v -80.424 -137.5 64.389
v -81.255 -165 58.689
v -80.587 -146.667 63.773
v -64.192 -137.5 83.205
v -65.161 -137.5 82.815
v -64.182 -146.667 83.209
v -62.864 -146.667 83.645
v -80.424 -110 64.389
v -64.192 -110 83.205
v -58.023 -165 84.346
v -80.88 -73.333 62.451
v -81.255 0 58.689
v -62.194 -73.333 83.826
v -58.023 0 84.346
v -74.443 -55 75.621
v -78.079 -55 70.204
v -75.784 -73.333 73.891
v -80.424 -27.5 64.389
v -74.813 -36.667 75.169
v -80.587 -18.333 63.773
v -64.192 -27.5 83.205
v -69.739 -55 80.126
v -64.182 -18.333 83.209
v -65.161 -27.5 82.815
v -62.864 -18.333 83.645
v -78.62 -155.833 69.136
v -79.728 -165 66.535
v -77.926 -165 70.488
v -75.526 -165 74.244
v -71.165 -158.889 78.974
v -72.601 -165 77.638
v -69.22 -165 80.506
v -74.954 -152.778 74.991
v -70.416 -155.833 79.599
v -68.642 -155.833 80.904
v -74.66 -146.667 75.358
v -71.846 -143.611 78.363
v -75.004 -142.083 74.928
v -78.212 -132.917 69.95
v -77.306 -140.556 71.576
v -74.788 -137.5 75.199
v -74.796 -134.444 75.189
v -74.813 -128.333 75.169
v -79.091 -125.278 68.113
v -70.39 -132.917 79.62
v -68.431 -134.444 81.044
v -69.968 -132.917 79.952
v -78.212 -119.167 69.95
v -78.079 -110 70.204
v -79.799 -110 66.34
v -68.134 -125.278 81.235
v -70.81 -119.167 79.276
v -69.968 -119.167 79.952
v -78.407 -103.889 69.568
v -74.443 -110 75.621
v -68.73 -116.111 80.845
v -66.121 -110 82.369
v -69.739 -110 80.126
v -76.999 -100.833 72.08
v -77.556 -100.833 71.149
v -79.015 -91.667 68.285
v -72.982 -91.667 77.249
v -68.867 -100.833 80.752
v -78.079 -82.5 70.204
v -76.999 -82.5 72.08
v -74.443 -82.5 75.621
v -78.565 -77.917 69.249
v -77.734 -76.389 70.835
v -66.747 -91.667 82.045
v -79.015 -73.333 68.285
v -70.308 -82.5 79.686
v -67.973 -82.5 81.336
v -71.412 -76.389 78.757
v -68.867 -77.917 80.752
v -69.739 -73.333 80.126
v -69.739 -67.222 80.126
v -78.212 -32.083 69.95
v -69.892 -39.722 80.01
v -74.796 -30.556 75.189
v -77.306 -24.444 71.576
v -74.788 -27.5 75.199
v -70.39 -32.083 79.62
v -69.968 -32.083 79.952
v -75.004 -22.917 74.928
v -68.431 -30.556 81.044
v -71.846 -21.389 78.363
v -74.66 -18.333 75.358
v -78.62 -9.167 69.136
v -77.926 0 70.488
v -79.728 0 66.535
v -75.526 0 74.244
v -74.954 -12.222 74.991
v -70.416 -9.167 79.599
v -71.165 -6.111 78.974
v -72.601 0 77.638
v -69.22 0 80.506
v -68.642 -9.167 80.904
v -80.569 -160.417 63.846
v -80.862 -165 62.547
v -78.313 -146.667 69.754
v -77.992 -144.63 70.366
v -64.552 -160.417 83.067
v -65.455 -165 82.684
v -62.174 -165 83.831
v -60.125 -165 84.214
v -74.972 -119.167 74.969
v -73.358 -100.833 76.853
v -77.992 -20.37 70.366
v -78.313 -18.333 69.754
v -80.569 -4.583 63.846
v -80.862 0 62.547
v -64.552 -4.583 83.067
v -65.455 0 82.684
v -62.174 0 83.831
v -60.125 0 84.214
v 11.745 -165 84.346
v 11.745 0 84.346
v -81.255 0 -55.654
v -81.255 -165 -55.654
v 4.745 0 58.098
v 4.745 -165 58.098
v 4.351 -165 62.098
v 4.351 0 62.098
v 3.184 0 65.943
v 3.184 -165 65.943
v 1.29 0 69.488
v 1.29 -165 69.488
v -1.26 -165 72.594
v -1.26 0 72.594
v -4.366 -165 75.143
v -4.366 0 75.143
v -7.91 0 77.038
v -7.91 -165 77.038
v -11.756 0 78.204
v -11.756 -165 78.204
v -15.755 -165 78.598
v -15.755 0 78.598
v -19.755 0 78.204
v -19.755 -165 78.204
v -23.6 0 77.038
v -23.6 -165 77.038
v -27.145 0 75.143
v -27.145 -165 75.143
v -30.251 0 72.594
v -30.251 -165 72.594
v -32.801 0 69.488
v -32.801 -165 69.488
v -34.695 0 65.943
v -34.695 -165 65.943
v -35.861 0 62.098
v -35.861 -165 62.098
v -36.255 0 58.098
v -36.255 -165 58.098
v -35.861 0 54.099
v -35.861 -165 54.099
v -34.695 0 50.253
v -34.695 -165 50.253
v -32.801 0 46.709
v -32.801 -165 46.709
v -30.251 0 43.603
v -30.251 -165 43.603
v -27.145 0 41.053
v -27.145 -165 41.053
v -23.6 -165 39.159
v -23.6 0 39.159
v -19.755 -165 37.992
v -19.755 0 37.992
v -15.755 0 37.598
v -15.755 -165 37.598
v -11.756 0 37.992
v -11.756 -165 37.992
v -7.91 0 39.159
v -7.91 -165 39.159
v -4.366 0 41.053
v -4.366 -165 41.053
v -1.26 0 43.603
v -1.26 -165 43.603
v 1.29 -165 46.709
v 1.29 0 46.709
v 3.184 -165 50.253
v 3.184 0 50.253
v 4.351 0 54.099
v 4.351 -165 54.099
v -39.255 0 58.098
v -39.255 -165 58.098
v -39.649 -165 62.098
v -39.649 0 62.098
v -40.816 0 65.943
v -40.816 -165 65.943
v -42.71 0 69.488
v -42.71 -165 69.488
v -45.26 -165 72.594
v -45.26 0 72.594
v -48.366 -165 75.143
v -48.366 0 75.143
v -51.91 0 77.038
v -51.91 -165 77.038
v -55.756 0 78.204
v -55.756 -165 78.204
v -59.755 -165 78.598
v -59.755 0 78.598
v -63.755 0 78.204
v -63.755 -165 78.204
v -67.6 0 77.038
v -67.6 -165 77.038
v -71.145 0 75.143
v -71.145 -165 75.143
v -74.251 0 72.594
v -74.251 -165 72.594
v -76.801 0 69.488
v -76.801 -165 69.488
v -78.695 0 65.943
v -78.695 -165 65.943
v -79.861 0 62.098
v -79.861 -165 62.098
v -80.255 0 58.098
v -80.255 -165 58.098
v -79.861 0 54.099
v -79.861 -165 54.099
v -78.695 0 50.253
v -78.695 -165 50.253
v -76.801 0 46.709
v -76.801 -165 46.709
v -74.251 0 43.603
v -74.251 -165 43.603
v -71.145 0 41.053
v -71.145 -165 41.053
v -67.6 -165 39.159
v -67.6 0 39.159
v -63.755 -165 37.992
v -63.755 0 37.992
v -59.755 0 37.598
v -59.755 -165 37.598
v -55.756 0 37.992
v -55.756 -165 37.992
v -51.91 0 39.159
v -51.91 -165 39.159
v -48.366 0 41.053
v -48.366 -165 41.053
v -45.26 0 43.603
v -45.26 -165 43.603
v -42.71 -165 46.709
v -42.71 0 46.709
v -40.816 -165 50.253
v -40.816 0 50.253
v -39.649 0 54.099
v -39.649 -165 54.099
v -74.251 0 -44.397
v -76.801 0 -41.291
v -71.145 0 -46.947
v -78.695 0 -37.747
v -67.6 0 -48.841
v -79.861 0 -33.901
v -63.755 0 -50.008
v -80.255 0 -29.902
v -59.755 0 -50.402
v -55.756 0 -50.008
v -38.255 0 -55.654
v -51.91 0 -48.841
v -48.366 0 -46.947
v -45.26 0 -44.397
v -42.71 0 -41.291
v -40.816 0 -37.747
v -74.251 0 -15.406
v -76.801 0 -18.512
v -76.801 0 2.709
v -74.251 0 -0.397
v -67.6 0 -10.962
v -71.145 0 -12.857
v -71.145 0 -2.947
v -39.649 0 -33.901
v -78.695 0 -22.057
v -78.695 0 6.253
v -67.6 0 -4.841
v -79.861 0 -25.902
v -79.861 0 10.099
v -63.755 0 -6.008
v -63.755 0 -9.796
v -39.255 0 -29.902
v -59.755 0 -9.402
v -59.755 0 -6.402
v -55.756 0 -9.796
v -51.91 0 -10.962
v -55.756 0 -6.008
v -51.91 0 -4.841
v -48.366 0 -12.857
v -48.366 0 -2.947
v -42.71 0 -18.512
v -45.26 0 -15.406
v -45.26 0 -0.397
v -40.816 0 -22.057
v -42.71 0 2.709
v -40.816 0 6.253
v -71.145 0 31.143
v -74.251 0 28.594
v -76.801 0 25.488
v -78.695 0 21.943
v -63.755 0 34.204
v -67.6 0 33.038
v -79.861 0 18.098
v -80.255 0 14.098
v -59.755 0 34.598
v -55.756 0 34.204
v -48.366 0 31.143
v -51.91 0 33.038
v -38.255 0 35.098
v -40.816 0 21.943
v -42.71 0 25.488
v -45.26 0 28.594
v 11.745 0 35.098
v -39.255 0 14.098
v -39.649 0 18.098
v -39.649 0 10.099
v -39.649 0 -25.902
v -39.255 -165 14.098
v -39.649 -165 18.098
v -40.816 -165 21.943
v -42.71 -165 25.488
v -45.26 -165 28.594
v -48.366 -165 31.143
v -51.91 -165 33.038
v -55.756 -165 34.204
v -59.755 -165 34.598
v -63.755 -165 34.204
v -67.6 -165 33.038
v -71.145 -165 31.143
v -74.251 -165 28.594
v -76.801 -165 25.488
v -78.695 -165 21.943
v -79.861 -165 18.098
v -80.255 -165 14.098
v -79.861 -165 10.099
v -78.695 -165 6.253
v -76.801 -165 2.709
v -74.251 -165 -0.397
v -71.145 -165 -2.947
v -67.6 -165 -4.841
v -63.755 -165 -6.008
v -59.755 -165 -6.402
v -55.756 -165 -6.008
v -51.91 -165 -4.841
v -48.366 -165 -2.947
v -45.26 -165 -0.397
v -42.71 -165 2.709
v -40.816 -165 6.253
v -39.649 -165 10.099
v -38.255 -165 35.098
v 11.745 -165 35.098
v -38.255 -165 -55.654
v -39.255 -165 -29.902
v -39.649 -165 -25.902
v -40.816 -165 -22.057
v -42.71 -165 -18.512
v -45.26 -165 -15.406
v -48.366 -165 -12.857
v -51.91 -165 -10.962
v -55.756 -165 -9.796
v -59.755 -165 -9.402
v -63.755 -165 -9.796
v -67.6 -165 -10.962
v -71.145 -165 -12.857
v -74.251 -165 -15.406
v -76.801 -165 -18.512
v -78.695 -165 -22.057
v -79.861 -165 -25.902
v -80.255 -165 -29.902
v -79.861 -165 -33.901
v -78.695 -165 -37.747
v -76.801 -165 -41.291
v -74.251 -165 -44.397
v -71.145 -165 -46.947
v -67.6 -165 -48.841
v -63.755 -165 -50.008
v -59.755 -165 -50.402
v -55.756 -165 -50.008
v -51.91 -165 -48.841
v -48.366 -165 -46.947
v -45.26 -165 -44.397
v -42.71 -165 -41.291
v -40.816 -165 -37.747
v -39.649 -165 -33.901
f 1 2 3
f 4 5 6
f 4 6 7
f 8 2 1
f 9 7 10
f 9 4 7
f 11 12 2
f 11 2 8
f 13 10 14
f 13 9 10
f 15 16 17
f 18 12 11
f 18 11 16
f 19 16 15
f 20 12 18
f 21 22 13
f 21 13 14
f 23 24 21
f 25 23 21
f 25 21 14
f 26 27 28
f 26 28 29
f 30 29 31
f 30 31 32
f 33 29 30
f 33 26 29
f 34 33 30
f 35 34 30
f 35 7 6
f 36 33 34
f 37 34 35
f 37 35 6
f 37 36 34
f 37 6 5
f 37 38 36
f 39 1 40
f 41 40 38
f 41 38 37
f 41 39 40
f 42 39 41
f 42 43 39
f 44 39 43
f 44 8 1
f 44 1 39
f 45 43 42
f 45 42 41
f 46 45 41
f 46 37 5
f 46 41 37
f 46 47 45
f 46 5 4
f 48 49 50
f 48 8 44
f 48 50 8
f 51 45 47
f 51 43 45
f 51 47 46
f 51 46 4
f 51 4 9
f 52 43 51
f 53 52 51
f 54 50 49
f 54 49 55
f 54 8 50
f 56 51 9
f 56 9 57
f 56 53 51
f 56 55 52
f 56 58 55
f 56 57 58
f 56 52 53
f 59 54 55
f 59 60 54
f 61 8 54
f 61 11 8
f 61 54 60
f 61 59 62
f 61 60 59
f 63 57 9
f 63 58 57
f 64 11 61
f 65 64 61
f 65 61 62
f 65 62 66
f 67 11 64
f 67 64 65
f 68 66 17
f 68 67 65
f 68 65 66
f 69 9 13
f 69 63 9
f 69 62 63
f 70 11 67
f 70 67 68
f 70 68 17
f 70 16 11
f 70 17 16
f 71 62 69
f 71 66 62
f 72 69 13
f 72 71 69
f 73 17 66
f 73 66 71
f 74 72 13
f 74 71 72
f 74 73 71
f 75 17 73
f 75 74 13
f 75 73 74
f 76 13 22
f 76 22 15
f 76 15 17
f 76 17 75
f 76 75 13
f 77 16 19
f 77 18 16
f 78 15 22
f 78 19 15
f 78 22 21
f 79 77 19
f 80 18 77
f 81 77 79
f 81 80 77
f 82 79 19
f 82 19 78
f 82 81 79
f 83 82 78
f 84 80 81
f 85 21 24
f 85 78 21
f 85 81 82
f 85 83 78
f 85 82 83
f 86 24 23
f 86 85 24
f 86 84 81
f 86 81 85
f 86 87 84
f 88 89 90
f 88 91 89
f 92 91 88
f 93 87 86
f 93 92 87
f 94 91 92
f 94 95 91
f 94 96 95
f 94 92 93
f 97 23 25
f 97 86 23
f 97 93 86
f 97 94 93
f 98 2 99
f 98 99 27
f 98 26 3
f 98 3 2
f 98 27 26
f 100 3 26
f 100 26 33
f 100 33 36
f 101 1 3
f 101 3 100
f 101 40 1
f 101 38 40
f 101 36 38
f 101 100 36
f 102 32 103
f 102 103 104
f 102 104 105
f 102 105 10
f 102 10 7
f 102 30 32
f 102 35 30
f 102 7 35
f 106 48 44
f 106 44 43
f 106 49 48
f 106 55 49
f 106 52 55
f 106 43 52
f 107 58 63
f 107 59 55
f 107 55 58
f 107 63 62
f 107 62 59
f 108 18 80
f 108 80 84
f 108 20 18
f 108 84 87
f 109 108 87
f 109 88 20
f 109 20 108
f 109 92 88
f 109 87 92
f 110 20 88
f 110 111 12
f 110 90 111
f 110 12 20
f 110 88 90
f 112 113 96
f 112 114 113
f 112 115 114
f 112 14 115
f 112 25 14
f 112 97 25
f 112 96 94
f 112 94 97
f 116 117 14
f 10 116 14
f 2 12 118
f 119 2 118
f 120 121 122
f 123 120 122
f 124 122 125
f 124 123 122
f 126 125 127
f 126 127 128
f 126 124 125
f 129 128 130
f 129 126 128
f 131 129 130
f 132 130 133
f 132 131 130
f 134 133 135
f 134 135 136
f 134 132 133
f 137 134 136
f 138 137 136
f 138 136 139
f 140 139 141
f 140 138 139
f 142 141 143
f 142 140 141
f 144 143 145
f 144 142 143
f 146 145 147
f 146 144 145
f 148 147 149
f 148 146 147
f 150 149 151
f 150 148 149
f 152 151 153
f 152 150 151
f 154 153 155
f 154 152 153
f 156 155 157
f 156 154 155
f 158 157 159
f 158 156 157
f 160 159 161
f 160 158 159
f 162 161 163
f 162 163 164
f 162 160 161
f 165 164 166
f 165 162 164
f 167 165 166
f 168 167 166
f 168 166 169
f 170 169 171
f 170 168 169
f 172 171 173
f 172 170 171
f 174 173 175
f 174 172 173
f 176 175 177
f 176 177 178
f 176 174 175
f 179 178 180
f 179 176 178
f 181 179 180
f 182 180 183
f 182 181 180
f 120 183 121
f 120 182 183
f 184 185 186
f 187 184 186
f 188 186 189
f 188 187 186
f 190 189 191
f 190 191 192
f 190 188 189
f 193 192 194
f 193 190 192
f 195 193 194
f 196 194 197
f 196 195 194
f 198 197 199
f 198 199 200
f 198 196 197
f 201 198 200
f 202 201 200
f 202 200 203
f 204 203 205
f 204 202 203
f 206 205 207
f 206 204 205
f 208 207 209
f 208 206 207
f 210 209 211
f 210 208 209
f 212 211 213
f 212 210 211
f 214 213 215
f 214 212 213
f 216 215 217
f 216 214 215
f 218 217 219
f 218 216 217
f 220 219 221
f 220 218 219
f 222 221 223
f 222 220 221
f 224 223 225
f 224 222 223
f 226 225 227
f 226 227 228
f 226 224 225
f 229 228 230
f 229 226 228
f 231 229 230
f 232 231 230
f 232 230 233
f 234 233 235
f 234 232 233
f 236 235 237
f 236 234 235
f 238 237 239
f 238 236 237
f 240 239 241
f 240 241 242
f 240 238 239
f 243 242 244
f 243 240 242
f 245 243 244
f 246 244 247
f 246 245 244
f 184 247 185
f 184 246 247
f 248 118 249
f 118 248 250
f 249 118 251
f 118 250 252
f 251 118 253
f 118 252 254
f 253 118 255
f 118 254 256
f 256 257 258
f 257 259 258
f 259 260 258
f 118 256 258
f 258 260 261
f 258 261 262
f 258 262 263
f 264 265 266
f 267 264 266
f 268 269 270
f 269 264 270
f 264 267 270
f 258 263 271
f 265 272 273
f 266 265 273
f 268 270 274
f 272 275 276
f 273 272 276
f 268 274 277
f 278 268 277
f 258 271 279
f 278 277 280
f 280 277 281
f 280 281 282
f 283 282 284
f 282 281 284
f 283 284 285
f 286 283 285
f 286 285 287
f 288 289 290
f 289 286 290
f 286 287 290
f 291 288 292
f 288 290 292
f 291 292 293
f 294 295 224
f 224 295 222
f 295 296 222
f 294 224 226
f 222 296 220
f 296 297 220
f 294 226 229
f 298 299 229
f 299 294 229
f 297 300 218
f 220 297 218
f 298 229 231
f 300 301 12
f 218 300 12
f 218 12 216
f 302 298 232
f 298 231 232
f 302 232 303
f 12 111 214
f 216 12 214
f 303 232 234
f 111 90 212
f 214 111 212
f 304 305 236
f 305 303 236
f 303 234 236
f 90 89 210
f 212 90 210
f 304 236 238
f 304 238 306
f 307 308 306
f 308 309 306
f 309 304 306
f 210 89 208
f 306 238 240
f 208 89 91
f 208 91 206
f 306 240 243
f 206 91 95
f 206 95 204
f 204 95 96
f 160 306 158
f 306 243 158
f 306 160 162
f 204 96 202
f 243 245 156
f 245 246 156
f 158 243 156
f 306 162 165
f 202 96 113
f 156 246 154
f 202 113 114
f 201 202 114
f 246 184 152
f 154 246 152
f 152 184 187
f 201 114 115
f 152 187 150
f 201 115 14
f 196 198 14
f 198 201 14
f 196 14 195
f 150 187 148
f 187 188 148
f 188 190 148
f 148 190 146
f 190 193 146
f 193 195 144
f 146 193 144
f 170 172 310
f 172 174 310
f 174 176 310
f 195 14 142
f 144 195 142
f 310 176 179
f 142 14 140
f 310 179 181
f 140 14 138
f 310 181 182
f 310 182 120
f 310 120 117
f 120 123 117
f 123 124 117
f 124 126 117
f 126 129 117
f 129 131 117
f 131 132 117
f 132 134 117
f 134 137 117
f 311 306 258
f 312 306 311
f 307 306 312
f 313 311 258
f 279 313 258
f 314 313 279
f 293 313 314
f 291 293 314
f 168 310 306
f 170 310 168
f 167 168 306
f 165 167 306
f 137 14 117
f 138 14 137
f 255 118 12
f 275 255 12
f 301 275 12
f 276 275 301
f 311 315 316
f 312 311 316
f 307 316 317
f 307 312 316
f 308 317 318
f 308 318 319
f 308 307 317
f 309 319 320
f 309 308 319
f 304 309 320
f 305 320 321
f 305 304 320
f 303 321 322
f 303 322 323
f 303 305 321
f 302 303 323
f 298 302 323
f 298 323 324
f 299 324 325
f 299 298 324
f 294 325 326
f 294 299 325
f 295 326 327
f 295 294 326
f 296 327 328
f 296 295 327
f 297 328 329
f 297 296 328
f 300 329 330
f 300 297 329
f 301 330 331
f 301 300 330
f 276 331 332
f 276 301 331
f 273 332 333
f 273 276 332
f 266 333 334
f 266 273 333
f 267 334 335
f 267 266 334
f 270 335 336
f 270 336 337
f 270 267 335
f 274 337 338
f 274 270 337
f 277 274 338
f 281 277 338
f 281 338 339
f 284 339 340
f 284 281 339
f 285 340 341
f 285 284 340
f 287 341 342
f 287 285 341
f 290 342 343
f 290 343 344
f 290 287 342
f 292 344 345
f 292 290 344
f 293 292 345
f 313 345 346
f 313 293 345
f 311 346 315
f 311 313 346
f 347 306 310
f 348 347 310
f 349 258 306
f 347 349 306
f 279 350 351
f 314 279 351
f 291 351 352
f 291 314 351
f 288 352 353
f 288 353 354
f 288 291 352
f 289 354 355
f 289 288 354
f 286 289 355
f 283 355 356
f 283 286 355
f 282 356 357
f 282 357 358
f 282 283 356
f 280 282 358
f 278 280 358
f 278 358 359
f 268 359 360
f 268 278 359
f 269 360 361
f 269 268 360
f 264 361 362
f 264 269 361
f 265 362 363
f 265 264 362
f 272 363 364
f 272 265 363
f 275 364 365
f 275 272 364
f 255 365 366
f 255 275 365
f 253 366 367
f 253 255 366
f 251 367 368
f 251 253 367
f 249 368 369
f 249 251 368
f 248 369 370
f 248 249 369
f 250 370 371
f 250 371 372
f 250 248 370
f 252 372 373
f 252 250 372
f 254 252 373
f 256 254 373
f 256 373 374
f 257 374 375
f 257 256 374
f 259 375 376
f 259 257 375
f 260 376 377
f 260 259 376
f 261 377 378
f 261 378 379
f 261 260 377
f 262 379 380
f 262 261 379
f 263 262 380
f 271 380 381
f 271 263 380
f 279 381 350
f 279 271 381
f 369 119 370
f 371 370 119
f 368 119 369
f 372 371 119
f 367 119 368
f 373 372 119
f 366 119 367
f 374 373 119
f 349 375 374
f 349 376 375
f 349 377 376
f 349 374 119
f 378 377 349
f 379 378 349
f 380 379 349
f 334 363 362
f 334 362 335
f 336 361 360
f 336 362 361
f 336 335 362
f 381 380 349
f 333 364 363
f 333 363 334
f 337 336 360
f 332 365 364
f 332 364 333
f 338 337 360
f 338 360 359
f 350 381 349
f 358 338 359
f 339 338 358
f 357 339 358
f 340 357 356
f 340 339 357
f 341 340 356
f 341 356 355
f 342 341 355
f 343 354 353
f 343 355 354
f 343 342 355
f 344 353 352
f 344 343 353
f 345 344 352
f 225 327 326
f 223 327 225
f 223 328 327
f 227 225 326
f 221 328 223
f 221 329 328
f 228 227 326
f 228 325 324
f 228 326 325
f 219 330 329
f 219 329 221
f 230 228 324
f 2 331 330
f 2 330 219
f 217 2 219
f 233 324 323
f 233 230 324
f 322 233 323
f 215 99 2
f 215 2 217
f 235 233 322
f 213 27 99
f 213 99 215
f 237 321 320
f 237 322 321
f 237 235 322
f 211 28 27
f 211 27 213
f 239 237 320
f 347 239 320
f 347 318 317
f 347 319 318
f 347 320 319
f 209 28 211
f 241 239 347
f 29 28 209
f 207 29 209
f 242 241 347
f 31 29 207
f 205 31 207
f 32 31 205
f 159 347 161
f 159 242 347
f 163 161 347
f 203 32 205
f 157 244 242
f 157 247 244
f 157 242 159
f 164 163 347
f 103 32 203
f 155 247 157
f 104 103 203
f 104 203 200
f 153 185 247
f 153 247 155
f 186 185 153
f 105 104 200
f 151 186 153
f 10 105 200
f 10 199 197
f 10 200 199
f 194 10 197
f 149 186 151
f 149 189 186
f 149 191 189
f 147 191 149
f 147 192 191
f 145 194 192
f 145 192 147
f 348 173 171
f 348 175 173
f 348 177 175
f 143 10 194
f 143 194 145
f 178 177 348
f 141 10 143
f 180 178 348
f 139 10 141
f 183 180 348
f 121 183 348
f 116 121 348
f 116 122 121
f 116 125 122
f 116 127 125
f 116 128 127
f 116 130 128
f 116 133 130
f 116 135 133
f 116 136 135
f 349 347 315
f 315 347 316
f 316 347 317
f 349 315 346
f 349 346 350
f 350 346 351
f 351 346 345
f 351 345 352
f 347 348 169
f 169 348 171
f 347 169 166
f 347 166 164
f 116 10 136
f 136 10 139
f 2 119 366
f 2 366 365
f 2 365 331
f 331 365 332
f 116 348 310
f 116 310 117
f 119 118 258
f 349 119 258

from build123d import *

# Parameters (mm, degrees)
F0_R     = 20.5
F1_DEPTH = 165


with BuildPart() as f1:
    # F0 (on Front) → F1 (new body)
    with BuildSketch(Plane.XZ):
        with BuildLine():
            Line((-81.255392, -55.654403), (-59.755392, -55.654403))
            Line((-59.755392, -55.654403), (-38.255392, -55.654403))
            Line((-38.255392, -55.654403), (-38.255392, 35.098321))
            Line((-38.255392, 35.098321), (11.744608, 35.098321))
            Line((11.744608, 35.098321), (11.744608, 84.345597))
            Line((11.744608, 84.345597), (-58.023451, 84.345597))
            add(Edge.make_bspline(
                [(-81.255392, 58.68857), (-81.255392, 69.632433), (-70.832212, 84.345597), (-58.023451, 84.345597)],
                knots=[0, 0, 0, 0, 34.612225, 34.612225, 34.612225, 34.612225], degree=3))
            Line((-81.255392, 58.68857), (-81.255392, -55.654403))
        make_face()
        with Locations((-59.755392, -29.901679)):
            Circle(F0_R, mode=Mode.SUBTRACT)
        with Locations((-59.755392, 14.098321)):
            Circle(F0_R, mode=Mode.SUBTRACT)
        with Locations((-59.755392, 58.098321)):
            Circle(F0_R, mode=Mode.SUBTRACT)
        with Locations((-15.755392, 58.098321)):
            Circle(F0_R, mode=Mode.SUBTRACT)
    extrude(amount=F1_DEPTH)


solid = f1.part
